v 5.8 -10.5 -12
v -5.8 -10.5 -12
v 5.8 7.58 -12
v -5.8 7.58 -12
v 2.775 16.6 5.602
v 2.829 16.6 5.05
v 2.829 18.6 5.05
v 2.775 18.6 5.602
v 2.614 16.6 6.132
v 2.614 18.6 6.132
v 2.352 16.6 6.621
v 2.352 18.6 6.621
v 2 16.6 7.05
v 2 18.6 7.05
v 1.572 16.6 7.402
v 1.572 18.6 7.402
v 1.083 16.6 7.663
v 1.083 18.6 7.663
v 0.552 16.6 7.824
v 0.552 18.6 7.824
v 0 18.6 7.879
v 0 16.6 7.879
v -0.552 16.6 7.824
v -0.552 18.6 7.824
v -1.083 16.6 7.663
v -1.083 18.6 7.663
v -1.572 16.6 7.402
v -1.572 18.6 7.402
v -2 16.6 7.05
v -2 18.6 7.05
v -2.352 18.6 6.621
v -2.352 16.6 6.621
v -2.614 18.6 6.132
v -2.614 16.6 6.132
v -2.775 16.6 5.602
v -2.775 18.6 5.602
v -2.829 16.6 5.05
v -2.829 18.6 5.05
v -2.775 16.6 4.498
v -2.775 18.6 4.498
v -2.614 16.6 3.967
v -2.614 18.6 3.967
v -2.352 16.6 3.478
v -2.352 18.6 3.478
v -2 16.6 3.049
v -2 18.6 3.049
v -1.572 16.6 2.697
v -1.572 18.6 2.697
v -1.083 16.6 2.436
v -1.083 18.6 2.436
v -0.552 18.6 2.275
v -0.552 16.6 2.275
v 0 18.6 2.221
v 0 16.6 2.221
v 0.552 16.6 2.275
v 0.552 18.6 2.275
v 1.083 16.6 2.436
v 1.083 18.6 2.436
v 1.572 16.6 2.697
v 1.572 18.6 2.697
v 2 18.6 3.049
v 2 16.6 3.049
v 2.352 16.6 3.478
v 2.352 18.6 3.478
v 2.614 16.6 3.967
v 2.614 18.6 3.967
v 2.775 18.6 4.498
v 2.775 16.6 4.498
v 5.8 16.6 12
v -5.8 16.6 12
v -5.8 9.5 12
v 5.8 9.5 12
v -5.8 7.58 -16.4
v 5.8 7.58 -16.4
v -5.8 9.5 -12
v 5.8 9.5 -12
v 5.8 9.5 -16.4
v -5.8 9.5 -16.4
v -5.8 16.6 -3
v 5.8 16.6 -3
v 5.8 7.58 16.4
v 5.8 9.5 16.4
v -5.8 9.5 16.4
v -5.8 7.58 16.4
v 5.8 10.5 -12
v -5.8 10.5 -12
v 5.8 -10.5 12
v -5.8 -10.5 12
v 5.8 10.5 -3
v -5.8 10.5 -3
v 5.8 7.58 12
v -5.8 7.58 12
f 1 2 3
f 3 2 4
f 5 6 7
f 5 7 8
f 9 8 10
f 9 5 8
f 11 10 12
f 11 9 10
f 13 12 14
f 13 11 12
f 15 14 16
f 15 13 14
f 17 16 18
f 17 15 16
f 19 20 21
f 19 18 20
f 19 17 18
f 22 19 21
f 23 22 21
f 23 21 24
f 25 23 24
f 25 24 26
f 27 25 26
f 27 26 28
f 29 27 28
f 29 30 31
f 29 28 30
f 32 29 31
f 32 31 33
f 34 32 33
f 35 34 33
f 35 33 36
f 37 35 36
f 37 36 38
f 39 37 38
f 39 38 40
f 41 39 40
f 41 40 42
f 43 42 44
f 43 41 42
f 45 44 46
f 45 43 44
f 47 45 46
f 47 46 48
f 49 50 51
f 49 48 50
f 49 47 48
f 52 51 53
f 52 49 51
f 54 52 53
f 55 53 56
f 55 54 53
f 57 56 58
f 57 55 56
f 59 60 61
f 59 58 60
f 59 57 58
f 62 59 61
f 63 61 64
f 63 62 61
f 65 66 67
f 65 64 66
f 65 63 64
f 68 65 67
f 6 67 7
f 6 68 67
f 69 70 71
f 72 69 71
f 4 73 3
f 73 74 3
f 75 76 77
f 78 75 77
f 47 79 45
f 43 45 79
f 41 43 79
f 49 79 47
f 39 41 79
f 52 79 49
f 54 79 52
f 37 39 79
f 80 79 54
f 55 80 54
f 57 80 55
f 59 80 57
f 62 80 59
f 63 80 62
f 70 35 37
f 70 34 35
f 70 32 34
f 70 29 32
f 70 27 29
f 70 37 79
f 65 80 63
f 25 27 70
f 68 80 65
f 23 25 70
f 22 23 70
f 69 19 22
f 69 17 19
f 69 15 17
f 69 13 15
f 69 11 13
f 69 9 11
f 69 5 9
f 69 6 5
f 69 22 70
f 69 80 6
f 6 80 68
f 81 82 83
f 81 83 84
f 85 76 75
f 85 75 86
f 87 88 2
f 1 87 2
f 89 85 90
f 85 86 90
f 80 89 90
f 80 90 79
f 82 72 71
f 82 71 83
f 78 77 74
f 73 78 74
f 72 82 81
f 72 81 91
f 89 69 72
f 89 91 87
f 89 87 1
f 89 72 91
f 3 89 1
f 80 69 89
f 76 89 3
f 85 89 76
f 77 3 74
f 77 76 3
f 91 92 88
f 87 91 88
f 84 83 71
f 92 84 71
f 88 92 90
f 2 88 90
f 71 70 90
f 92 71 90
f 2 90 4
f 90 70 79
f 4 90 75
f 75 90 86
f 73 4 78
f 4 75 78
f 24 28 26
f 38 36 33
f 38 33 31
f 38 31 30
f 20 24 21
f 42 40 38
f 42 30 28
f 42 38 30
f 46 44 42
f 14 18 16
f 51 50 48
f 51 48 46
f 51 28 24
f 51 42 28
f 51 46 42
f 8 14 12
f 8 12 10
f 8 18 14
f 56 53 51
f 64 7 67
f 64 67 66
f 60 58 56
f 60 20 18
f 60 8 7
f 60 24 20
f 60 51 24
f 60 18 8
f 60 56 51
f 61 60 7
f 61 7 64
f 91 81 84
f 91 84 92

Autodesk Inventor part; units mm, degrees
ref_plane "YZ Plane" through (0, 0, 0) normal (1, 0, 0) x (0, 1, 0)
ref_plane "XZ Plane" through (0, 0, 0) normal (0, 1, 0) x (-1, 0, 0)
ref_plane "XY Plane" through (0, 0, 0) normal (0, 0, 1) x (1, 0, 0)
sketch "Sketch1" plane through (0, 0, 0) normal (1, 0, 0) x (0, 1, 0)
  line L0 (10.5, 12) -> (-10.5, 12)
  line L1 (-10.5, 12) -> (-10.5, -12)
  line L2 (-10.5, -12) -> (10.5, -12)
  line L3 (10.5, -12) -> (10.5, 12)
  line L4 (10.5, 12) -> (-10.5, -12) construction
  line L5 (-10.5, 12) -> (10.5, -12) construction
  point P0 (0, 0)
  dimension "d0" = 21
  dimension "d1" = 24
extrude "Extrusion1" add sketch "Sketch1" along normal mid plane 11.6
sketch "Sketch2" plane through (5.8, 0, 0) normal (1, 0, 0) x (0, 0, -1)
  line L0 (-12, 9.5) -> (-16.4, 9.5)
  line L1 (-16.4, 9.5) -> (-16.4, 7.58)
  line L2 (-16.4, 7.58) -> (-12, 7.58)
  line L3 (-12, 7.58) -> (-12, 9.5)
  line L4 (-12, -10.5) -> (12, -10.5) projected
  line L5 (0, -10.5) -> (0, 10.5)
  line L6 (12, 9.5) -> (16.4, 9.5)
  line L7 (16.4, 9.5) -> (16.4, 7.58)
  line L8 (16.4, 7.58) -> (12, 7.58)
  line L9 (12, 7.58) -> (12, 9.5)
  line L10 (-12, 9.5) -> (-13.7444, 9.5)
  point P0 (0, 0)
  point P1 (-12, 10.5)
  dimension "d4" = 4.4
  dimension "d5" = 1.92
  dimension "d8" = 1
extrude "Extrusion2" add sketch "Sketch2" against normal up to surface (11.6 mm away)
sketch "Sketch3" plane through (5.8, 0, 0) normal (1, 0, 0) x (0, 0, -1)
  line L0 (-12, 10.5) -> (3, 10.5)
  line L1 (3, 10.5) -> (3, 16.6)
  line L2 (3, 16.6) -> (-12, 16.6)
  line L3 (-12, 16.6) -> (-12, 10.5)
  line L4 (12, 10.5) -> (-12, 10.5) projected
  point P0 (0, 0)
  dimension "d9" = 15
  dimension "d10" = 6.1
extrude "Extrusion3" add sketch "Sketch3" against normal up to surface (11.6 mm away)
sketch "Sketch4" plane through (5.8, 16.6, 12) normal (0, 1, 0) x (1, 0, 0)
  circle A0 centre (-5.8, 6.9504) radius 2.829
  point P0 (-5.8, 12)
extrude "Extrusion4" add sketch "Sketch4" along normal blind 2
properties part number "servoMotor"
